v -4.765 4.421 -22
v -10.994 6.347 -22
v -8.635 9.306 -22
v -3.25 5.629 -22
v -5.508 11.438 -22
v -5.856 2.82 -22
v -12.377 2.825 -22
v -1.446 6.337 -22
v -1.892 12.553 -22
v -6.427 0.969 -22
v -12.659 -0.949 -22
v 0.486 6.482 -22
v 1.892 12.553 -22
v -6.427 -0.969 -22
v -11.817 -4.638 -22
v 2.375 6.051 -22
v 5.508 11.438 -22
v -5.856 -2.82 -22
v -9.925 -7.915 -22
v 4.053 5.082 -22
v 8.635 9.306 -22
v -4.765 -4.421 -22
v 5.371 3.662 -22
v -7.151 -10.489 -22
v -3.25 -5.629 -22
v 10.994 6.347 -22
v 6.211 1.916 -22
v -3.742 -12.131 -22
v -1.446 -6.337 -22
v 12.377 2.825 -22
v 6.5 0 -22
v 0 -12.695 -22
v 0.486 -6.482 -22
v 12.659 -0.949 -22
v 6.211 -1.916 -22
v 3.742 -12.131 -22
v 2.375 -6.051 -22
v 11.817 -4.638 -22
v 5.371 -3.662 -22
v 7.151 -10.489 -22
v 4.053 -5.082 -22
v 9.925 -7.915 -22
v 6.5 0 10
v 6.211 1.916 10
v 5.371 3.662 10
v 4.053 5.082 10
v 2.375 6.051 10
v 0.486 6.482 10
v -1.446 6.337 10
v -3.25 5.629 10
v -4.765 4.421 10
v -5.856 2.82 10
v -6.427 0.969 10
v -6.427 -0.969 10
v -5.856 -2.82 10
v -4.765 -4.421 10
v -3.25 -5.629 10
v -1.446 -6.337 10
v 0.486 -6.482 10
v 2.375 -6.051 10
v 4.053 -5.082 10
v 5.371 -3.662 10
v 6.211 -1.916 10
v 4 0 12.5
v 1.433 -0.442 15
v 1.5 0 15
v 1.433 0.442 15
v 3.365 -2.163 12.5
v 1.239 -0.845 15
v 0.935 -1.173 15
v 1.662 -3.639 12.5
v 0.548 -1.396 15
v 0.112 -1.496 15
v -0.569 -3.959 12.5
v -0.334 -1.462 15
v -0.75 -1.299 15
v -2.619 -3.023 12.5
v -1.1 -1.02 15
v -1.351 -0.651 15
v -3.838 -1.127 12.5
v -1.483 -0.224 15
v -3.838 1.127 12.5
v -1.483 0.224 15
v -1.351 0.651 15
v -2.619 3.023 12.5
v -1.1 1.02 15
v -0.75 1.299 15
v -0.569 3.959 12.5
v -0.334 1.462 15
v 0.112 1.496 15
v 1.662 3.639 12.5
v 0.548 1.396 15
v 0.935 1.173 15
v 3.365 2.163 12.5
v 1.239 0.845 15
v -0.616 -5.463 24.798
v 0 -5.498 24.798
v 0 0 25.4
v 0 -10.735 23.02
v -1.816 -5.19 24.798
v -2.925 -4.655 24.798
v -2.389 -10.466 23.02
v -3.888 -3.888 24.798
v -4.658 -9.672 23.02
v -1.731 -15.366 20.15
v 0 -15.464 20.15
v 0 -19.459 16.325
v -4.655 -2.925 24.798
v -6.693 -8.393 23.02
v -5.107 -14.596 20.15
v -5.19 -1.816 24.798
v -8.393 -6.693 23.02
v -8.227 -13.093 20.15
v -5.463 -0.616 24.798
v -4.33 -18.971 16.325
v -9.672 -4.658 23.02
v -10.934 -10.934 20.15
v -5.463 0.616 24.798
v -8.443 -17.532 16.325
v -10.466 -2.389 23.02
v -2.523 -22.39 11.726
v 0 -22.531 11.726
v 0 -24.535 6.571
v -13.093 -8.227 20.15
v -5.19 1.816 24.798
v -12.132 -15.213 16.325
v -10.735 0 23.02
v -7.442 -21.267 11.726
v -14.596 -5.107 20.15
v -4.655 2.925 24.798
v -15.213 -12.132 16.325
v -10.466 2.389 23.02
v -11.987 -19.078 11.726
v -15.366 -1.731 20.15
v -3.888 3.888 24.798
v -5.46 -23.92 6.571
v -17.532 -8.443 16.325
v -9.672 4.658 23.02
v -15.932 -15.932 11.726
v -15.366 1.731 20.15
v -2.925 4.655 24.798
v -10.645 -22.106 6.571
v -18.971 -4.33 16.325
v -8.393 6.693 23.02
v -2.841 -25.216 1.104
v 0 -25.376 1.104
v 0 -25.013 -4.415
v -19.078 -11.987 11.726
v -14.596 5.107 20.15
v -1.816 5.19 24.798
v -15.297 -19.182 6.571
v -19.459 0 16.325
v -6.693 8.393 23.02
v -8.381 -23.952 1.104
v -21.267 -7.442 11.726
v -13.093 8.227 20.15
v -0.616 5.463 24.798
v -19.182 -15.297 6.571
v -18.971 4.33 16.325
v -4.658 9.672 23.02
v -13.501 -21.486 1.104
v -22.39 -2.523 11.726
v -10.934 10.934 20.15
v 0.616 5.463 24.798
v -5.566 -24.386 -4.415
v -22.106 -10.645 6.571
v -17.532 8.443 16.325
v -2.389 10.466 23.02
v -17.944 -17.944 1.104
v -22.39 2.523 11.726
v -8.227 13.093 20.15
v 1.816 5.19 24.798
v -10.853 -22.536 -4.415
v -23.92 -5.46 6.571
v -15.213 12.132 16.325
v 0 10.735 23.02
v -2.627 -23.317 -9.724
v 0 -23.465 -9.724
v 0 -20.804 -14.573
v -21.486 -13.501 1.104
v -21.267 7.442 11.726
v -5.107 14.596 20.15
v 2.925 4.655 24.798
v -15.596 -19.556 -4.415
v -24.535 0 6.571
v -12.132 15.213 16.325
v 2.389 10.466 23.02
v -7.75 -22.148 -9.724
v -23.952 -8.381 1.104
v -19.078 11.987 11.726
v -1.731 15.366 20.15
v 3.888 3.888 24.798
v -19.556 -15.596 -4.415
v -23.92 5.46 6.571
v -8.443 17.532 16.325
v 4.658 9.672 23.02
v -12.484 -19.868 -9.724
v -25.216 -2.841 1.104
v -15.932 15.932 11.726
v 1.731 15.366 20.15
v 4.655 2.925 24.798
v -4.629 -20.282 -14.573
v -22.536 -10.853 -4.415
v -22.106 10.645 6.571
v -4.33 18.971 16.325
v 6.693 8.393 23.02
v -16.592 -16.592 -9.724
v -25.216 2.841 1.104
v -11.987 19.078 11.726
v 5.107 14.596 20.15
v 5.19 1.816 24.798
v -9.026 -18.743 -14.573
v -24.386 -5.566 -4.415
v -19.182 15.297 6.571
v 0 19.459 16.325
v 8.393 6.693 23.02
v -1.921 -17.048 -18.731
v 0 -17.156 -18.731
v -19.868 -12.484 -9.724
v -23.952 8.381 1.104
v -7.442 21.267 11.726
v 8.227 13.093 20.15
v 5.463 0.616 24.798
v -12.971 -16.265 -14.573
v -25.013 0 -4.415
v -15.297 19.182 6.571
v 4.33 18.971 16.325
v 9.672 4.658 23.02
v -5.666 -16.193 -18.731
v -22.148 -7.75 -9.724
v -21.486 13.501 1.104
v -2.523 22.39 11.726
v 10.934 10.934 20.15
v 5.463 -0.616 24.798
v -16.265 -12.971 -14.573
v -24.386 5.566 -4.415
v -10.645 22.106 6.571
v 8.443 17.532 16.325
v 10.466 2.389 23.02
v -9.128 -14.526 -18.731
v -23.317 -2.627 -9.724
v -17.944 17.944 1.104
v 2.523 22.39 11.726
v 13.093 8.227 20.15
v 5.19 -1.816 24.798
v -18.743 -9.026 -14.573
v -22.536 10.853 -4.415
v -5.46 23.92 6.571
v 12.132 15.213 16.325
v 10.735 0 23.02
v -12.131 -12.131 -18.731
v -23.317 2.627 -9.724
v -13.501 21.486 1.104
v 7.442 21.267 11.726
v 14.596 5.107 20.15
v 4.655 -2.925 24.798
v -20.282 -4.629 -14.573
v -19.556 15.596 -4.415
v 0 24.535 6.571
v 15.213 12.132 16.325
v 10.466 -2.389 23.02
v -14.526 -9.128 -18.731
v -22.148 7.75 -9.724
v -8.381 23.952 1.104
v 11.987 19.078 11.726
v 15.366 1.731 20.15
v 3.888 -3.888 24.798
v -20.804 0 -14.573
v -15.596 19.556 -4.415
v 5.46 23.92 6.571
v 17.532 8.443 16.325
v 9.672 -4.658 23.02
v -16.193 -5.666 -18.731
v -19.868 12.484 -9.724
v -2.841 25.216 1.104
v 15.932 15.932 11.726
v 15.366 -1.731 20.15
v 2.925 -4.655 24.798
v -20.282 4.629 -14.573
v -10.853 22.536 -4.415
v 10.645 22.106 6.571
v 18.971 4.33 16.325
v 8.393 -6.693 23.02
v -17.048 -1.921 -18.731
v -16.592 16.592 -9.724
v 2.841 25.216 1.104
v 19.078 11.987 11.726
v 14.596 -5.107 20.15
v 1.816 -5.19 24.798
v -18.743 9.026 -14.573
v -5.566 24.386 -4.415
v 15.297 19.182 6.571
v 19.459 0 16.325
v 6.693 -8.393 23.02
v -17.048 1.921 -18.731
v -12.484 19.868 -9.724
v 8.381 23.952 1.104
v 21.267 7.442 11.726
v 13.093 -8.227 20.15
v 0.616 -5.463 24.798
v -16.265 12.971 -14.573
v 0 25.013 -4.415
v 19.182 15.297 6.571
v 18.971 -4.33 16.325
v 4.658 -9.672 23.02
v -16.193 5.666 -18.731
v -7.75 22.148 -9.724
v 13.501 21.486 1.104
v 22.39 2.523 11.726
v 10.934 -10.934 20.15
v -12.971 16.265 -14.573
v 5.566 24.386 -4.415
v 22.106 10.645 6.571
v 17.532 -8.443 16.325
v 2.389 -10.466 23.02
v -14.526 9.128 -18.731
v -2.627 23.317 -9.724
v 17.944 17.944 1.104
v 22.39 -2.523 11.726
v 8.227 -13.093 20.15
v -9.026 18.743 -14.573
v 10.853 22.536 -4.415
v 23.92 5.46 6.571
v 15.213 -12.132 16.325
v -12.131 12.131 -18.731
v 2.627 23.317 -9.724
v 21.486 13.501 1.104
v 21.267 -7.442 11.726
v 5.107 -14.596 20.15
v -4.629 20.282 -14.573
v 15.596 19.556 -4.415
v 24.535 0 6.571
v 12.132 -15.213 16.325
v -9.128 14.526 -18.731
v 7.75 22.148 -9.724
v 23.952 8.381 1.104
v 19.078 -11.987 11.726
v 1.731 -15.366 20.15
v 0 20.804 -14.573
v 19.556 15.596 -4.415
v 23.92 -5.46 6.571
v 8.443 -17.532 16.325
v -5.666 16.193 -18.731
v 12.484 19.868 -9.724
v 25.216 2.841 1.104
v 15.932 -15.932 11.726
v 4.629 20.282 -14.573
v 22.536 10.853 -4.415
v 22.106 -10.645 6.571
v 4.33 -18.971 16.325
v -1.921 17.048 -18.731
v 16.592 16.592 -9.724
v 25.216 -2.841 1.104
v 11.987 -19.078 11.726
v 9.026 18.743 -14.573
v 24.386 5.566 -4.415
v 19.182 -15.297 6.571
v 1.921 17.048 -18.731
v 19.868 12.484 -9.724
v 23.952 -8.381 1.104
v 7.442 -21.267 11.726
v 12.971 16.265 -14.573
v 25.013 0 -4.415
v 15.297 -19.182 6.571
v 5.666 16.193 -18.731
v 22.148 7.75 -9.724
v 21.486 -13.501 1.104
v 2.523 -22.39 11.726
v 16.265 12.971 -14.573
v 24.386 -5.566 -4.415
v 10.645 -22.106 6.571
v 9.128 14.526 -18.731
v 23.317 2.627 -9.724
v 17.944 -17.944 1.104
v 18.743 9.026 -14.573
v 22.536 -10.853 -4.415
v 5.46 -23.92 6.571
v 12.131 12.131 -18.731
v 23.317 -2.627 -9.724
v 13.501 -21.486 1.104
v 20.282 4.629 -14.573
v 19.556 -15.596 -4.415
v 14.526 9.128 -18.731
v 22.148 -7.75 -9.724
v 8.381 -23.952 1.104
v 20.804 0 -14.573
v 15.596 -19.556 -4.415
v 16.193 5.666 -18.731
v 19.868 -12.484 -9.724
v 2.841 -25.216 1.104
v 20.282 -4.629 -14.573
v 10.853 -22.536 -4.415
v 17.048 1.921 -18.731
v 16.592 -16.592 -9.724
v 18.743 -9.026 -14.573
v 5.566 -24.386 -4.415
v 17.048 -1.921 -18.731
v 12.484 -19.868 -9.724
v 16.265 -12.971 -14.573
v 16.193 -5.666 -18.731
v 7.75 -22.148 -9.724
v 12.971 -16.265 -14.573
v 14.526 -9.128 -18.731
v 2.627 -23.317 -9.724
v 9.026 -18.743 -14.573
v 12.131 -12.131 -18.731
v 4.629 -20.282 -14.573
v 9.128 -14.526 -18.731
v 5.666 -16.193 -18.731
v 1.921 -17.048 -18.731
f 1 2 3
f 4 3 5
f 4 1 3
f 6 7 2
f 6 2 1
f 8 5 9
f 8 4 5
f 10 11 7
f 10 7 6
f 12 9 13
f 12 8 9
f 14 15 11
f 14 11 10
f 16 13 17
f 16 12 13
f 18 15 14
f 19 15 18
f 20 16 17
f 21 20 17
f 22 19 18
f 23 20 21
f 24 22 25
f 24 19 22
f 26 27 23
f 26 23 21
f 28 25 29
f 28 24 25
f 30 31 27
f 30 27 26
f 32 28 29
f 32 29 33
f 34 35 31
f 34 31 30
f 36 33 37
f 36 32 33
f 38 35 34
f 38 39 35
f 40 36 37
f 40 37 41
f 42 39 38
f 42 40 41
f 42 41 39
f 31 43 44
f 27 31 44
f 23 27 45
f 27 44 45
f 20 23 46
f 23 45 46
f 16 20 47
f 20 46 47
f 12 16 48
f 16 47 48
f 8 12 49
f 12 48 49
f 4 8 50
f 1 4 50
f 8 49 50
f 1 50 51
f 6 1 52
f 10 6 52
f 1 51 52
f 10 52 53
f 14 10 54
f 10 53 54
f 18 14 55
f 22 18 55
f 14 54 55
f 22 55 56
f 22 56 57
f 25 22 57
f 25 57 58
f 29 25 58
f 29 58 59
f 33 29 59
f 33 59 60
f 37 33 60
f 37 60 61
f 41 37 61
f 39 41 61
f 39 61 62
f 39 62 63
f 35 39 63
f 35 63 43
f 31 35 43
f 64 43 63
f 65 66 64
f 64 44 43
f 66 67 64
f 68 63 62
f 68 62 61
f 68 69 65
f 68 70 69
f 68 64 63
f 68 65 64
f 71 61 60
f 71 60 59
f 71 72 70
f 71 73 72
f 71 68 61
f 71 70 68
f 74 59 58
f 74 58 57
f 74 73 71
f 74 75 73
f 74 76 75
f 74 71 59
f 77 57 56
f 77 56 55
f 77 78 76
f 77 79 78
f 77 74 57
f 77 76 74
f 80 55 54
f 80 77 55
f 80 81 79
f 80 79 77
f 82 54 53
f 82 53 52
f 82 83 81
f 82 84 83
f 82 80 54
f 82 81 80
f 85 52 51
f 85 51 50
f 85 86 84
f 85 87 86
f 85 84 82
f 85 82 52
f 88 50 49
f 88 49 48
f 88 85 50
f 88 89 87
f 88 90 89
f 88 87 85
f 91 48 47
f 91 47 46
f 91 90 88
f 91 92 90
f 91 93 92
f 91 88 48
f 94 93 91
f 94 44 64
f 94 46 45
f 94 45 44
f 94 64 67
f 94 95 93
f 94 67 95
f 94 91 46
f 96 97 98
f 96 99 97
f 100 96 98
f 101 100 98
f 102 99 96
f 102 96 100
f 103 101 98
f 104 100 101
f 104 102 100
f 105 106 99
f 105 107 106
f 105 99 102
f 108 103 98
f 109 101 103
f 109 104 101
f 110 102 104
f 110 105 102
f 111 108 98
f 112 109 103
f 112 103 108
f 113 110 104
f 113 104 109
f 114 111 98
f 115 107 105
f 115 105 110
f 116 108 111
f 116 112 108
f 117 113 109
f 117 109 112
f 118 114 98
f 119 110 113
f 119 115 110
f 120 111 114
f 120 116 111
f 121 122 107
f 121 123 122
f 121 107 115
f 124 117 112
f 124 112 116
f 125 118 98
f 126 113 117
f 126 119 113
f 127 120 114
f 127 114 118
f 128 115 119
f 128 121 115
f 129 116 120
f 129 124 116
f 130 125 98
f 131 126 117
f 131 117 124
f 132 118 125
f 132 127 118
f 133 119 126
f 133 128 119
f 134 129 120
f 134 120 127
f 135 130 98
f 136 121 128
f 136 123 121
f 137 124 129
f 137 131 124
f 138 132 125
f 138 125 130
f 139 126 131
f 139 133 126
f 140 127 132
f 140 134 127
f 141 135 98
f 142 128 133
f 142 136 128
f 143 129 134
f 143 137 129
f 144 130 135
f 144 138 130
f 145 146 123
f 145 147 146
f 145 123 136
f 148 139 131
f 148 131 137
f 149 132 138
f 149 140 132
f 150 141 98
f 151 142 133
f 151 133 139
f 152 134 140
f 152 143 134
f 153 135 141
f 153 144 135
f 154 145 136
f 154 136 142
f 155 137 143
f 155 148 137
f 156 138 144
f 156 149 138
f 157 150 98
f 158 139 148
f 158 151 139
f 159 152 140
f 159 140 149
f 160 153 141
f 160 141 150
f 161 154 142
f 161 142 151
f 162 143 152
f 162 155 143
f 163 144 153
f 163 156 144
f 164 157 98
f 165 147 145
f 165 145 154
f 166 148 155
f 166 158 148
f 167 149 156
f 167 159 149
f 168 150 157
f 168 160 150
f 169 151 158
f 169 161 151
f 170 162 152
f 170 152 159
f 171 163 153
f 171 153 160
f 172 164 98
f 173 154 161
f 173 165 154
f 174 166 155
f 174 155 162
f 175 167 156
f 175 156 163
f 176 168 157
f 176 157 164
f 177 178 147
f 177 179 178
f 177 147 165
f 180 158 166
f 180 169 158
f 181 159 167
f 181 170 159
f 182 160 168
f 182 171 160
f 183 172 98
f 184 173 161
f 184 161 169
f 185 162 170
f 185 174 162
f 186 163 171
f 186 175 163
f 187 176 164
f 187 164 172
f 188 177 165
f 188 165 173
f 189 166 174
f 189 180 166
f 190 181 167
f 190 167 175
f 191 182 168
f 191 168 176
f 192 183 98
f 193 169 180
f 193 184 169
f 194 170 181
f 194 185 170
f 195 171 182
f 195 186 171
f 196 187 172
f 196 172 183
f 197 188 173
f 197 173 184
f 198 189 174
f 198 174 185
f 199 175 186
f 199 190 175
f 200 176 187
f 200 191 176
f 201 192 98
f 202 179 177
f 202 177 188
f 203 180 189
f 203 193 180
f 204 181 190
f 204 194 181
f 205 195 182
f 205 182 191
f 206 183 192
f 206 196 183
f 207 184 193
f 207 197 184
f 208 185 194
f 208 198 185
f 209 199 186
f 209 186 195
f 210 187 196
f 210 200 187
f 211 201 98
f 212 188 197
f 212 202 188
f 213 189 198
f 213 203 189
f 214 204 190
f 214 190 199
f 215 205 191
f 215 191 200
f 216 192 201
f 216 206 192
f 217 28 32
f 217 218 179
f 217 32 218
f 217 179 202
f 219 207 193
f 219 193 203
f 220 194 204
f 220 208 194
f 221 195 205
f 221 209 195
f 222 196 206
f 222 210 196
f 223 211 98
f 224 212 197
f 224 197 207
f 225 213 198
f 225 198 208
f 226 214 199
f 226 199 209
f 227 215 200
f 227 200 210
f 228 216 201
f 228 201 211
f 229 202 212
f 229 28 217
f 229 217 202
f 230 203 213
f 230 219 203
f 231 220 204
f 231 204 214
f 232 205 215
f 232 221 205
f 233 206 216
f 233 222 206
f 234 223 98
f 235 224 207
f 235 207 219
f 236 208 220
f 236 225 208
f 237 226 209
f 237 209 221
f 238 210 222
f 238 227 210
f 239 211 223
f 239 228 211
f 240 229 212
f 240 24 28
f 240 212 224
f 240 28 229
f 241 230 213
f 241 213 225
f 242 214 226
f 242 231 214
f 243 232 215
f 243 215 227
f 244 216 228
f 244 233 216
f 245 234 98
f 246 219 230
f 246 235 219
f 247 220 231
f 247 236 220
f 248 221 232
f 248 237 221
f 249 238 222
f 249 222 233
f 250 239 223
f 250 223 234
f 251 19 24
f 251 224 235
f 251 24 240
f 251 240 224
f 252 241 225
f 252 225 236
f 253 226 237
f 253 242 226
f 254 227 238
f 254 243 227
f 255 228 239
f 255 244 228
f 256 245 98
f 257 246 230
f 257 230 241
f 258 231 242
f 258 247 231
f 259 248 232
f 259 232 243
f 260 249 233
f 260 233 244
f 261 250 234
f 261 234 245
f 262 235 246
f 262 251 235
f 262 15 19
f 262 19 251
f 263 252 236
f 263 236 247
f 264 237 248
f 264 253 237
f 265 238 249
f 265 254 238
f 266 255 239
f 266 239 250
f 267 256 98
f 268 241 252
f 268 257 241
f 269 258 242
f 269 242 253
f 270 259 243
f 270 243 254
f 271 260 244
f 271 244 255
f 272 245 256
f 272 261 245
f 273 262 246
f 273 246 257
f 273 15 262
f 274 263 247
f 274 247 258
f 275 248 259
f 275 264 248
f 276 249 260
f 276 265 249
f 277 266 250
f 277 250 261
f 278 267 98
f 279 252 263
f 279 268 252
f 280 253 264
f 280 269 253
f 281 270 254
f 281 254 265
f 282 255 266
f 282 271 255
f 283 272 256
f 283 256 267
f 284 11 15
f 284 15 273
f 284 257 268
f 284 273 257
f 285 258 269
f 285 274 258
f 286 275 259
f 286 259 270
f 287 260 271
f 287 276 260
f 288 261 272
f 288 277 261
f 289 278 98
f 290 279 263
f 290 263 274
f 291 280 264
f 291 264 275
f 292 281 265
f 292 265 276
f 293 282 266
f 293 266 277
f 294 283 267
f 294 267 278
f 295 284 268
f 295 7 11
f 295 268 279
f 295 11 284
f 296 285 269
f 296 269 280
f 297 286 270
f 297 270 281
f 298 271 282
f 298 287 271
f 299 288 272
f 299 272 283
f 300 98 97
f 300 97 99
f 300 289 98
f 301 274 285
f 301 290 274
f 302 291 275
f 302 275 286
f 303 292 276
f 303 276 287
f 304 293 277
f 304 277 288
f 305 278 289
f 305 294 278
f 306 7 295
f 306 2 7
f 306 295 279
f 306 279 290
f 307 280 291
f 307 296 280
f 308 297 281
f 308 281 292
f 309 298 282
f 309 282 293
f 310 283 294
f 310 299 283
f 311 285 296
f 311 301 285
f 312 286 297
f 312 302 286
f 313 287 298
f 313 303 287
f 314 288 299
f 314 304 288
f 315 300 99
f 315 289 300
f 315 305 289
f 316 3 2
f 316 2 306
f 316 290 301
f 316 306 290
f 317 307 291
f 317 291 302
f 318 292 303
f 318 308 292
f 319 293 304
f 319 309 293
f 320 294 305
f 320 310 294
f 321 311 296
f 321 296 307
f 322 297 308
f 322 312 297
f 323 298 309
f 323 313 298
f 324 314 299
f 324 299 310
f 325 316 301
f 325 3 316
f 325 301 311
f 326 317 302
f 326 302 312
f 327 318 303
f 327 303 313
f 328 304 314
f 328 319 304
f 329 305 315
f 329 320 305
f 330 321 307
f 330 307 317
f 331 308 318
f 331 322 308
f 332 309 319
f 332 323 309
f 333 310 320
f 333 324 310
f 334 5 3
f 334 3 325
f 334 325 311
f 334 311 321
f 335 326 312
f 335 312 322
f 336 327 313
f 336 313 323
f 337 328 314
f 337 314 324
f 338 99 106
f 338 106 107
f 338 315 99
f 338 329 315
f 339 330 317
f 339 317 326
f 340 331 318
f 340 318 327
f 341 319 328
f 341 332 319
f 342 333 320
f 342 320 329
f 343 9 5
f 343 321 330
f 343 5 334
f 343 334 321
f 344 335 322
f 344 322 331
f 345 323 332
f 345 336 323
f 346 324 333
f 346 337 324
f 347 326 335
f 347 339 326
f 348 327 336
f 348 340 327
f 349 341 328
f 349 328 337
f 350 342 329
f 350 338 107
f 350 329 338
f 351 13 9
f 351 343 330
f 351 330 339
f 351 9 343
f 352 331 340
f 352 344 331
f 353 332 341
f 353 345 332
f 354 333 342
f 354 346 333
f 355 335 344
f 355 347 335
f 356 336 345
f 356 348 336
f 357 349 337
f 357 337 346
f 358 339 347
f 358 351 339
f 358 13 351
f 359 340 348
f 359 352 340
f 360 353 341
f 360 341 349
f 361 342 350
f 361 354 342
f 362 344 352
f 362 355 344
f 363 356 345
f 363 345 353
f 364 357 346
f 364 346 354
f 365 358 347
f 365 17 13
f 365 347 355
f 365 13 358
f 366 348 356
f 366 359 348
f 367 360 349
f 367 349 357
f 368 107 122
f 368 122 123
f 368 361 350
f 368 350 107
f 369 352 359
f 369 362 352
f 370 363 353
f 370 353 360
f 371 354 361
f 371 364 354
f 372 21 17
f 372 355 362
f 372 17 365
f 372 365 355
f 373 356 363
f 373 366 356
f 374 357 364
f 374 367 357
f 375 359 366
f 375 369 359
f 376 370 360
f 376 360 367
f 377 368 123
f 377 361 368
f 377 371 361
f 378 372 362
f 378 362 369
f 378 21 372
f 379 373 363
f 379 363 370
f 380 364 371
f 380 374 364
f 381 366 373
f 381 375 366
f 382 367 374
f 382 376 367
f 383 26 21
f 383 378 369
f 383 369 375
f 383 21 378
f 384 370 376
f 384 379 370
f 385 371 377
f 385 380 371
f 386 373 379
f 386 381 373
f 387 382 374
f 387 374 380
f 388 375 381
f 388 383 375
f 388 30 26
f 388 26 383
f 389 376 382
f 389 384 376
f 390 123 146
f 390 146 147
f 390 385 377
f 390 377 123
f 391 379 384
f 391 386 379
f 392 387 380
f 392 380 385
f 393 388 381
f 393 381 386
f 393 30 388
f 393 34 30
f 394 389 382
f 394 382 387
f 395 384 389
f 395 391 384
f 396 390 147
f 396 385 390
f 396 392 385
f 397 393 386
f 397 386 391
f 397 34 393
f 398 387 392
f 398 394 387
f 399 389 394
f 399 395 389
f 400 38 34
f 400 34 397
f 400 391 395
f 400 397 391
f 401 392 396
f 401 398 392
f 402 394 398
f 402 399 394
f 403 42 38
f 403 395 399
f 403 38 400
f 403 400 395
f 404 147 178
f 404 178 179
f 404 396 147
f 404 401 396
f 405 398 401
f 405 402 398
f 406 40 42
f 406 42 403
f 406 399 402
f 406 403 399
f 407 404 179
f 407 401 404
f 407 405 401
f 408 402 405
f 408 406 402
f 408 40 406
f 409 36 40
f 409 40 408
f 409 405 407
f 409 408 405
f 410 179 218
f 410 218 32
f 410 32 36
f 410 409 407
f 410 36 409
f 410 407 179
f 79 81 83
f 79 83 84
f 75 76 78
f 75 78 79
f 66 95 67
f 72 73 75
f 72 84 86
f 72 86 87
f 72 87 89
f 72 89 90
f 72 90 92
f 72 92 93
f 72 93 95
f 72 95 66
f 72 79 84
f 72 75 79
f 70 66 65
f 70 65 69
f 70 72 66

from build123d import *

# Parameters (mm, degrees)
F2_R      = 6.5
F3_DEPTH  = 30
F4_W      = 107.489927
F4_H      = 49.906041
F5_DEPTH  = 15
F3_FACE_R = 6.5
F6_DEPTH  = 15
F7_SIZE   = 5


with BuildPart() as f1:
    # F0 (on Right) → F1 (revolve)
    with BuildSketch(Plane.YZ):
        with BuildLine():
            Line((0, -25.4), (0, 25.4))
            ThreePointArc((0, 25.4), (-25.4, 0), (0, -25.4))
        make_face()
    revolve(axis=Axis((0, 0, 0), (0, 0, -1)))

    # F2 (on Top) → F3 (cut)
    with BuildSketch(Plane.XY):
        Circle(F2_R)
    extrude(amount=-F3_DEPTH, mode=Mode.SUBTRACT)

    # F4 (on Front) → F5 (cut, symmetric)
    with BuildSketch(Plane.XZ):
        with Locations((11.955445, -46.953021)):
            Rectangle(F4_W, F4_H)
    extrude(amount=F5_DEPTH, both=True, mode=Mode.SUBTRACT)

    # F3_face (on face) → F6 (cut)
    with BuildSketch(Plane(origin=(0, 0, 0), x_dir=(1, 0, 0), z_dir=(0, 0, -1))):
        Circle(F3_FACE_R)
    extrude(amount=-F6_DEPTH, mode=Mode.SUBTRACT)

    # F7
    f7_edges = [f1.edges().sort_by_distance(p)[0] for p in [
        (-6.5, 0, 15),
    ]]
    chamfer(f7_edges, length=F7_SIZE)


solid = f1.part
